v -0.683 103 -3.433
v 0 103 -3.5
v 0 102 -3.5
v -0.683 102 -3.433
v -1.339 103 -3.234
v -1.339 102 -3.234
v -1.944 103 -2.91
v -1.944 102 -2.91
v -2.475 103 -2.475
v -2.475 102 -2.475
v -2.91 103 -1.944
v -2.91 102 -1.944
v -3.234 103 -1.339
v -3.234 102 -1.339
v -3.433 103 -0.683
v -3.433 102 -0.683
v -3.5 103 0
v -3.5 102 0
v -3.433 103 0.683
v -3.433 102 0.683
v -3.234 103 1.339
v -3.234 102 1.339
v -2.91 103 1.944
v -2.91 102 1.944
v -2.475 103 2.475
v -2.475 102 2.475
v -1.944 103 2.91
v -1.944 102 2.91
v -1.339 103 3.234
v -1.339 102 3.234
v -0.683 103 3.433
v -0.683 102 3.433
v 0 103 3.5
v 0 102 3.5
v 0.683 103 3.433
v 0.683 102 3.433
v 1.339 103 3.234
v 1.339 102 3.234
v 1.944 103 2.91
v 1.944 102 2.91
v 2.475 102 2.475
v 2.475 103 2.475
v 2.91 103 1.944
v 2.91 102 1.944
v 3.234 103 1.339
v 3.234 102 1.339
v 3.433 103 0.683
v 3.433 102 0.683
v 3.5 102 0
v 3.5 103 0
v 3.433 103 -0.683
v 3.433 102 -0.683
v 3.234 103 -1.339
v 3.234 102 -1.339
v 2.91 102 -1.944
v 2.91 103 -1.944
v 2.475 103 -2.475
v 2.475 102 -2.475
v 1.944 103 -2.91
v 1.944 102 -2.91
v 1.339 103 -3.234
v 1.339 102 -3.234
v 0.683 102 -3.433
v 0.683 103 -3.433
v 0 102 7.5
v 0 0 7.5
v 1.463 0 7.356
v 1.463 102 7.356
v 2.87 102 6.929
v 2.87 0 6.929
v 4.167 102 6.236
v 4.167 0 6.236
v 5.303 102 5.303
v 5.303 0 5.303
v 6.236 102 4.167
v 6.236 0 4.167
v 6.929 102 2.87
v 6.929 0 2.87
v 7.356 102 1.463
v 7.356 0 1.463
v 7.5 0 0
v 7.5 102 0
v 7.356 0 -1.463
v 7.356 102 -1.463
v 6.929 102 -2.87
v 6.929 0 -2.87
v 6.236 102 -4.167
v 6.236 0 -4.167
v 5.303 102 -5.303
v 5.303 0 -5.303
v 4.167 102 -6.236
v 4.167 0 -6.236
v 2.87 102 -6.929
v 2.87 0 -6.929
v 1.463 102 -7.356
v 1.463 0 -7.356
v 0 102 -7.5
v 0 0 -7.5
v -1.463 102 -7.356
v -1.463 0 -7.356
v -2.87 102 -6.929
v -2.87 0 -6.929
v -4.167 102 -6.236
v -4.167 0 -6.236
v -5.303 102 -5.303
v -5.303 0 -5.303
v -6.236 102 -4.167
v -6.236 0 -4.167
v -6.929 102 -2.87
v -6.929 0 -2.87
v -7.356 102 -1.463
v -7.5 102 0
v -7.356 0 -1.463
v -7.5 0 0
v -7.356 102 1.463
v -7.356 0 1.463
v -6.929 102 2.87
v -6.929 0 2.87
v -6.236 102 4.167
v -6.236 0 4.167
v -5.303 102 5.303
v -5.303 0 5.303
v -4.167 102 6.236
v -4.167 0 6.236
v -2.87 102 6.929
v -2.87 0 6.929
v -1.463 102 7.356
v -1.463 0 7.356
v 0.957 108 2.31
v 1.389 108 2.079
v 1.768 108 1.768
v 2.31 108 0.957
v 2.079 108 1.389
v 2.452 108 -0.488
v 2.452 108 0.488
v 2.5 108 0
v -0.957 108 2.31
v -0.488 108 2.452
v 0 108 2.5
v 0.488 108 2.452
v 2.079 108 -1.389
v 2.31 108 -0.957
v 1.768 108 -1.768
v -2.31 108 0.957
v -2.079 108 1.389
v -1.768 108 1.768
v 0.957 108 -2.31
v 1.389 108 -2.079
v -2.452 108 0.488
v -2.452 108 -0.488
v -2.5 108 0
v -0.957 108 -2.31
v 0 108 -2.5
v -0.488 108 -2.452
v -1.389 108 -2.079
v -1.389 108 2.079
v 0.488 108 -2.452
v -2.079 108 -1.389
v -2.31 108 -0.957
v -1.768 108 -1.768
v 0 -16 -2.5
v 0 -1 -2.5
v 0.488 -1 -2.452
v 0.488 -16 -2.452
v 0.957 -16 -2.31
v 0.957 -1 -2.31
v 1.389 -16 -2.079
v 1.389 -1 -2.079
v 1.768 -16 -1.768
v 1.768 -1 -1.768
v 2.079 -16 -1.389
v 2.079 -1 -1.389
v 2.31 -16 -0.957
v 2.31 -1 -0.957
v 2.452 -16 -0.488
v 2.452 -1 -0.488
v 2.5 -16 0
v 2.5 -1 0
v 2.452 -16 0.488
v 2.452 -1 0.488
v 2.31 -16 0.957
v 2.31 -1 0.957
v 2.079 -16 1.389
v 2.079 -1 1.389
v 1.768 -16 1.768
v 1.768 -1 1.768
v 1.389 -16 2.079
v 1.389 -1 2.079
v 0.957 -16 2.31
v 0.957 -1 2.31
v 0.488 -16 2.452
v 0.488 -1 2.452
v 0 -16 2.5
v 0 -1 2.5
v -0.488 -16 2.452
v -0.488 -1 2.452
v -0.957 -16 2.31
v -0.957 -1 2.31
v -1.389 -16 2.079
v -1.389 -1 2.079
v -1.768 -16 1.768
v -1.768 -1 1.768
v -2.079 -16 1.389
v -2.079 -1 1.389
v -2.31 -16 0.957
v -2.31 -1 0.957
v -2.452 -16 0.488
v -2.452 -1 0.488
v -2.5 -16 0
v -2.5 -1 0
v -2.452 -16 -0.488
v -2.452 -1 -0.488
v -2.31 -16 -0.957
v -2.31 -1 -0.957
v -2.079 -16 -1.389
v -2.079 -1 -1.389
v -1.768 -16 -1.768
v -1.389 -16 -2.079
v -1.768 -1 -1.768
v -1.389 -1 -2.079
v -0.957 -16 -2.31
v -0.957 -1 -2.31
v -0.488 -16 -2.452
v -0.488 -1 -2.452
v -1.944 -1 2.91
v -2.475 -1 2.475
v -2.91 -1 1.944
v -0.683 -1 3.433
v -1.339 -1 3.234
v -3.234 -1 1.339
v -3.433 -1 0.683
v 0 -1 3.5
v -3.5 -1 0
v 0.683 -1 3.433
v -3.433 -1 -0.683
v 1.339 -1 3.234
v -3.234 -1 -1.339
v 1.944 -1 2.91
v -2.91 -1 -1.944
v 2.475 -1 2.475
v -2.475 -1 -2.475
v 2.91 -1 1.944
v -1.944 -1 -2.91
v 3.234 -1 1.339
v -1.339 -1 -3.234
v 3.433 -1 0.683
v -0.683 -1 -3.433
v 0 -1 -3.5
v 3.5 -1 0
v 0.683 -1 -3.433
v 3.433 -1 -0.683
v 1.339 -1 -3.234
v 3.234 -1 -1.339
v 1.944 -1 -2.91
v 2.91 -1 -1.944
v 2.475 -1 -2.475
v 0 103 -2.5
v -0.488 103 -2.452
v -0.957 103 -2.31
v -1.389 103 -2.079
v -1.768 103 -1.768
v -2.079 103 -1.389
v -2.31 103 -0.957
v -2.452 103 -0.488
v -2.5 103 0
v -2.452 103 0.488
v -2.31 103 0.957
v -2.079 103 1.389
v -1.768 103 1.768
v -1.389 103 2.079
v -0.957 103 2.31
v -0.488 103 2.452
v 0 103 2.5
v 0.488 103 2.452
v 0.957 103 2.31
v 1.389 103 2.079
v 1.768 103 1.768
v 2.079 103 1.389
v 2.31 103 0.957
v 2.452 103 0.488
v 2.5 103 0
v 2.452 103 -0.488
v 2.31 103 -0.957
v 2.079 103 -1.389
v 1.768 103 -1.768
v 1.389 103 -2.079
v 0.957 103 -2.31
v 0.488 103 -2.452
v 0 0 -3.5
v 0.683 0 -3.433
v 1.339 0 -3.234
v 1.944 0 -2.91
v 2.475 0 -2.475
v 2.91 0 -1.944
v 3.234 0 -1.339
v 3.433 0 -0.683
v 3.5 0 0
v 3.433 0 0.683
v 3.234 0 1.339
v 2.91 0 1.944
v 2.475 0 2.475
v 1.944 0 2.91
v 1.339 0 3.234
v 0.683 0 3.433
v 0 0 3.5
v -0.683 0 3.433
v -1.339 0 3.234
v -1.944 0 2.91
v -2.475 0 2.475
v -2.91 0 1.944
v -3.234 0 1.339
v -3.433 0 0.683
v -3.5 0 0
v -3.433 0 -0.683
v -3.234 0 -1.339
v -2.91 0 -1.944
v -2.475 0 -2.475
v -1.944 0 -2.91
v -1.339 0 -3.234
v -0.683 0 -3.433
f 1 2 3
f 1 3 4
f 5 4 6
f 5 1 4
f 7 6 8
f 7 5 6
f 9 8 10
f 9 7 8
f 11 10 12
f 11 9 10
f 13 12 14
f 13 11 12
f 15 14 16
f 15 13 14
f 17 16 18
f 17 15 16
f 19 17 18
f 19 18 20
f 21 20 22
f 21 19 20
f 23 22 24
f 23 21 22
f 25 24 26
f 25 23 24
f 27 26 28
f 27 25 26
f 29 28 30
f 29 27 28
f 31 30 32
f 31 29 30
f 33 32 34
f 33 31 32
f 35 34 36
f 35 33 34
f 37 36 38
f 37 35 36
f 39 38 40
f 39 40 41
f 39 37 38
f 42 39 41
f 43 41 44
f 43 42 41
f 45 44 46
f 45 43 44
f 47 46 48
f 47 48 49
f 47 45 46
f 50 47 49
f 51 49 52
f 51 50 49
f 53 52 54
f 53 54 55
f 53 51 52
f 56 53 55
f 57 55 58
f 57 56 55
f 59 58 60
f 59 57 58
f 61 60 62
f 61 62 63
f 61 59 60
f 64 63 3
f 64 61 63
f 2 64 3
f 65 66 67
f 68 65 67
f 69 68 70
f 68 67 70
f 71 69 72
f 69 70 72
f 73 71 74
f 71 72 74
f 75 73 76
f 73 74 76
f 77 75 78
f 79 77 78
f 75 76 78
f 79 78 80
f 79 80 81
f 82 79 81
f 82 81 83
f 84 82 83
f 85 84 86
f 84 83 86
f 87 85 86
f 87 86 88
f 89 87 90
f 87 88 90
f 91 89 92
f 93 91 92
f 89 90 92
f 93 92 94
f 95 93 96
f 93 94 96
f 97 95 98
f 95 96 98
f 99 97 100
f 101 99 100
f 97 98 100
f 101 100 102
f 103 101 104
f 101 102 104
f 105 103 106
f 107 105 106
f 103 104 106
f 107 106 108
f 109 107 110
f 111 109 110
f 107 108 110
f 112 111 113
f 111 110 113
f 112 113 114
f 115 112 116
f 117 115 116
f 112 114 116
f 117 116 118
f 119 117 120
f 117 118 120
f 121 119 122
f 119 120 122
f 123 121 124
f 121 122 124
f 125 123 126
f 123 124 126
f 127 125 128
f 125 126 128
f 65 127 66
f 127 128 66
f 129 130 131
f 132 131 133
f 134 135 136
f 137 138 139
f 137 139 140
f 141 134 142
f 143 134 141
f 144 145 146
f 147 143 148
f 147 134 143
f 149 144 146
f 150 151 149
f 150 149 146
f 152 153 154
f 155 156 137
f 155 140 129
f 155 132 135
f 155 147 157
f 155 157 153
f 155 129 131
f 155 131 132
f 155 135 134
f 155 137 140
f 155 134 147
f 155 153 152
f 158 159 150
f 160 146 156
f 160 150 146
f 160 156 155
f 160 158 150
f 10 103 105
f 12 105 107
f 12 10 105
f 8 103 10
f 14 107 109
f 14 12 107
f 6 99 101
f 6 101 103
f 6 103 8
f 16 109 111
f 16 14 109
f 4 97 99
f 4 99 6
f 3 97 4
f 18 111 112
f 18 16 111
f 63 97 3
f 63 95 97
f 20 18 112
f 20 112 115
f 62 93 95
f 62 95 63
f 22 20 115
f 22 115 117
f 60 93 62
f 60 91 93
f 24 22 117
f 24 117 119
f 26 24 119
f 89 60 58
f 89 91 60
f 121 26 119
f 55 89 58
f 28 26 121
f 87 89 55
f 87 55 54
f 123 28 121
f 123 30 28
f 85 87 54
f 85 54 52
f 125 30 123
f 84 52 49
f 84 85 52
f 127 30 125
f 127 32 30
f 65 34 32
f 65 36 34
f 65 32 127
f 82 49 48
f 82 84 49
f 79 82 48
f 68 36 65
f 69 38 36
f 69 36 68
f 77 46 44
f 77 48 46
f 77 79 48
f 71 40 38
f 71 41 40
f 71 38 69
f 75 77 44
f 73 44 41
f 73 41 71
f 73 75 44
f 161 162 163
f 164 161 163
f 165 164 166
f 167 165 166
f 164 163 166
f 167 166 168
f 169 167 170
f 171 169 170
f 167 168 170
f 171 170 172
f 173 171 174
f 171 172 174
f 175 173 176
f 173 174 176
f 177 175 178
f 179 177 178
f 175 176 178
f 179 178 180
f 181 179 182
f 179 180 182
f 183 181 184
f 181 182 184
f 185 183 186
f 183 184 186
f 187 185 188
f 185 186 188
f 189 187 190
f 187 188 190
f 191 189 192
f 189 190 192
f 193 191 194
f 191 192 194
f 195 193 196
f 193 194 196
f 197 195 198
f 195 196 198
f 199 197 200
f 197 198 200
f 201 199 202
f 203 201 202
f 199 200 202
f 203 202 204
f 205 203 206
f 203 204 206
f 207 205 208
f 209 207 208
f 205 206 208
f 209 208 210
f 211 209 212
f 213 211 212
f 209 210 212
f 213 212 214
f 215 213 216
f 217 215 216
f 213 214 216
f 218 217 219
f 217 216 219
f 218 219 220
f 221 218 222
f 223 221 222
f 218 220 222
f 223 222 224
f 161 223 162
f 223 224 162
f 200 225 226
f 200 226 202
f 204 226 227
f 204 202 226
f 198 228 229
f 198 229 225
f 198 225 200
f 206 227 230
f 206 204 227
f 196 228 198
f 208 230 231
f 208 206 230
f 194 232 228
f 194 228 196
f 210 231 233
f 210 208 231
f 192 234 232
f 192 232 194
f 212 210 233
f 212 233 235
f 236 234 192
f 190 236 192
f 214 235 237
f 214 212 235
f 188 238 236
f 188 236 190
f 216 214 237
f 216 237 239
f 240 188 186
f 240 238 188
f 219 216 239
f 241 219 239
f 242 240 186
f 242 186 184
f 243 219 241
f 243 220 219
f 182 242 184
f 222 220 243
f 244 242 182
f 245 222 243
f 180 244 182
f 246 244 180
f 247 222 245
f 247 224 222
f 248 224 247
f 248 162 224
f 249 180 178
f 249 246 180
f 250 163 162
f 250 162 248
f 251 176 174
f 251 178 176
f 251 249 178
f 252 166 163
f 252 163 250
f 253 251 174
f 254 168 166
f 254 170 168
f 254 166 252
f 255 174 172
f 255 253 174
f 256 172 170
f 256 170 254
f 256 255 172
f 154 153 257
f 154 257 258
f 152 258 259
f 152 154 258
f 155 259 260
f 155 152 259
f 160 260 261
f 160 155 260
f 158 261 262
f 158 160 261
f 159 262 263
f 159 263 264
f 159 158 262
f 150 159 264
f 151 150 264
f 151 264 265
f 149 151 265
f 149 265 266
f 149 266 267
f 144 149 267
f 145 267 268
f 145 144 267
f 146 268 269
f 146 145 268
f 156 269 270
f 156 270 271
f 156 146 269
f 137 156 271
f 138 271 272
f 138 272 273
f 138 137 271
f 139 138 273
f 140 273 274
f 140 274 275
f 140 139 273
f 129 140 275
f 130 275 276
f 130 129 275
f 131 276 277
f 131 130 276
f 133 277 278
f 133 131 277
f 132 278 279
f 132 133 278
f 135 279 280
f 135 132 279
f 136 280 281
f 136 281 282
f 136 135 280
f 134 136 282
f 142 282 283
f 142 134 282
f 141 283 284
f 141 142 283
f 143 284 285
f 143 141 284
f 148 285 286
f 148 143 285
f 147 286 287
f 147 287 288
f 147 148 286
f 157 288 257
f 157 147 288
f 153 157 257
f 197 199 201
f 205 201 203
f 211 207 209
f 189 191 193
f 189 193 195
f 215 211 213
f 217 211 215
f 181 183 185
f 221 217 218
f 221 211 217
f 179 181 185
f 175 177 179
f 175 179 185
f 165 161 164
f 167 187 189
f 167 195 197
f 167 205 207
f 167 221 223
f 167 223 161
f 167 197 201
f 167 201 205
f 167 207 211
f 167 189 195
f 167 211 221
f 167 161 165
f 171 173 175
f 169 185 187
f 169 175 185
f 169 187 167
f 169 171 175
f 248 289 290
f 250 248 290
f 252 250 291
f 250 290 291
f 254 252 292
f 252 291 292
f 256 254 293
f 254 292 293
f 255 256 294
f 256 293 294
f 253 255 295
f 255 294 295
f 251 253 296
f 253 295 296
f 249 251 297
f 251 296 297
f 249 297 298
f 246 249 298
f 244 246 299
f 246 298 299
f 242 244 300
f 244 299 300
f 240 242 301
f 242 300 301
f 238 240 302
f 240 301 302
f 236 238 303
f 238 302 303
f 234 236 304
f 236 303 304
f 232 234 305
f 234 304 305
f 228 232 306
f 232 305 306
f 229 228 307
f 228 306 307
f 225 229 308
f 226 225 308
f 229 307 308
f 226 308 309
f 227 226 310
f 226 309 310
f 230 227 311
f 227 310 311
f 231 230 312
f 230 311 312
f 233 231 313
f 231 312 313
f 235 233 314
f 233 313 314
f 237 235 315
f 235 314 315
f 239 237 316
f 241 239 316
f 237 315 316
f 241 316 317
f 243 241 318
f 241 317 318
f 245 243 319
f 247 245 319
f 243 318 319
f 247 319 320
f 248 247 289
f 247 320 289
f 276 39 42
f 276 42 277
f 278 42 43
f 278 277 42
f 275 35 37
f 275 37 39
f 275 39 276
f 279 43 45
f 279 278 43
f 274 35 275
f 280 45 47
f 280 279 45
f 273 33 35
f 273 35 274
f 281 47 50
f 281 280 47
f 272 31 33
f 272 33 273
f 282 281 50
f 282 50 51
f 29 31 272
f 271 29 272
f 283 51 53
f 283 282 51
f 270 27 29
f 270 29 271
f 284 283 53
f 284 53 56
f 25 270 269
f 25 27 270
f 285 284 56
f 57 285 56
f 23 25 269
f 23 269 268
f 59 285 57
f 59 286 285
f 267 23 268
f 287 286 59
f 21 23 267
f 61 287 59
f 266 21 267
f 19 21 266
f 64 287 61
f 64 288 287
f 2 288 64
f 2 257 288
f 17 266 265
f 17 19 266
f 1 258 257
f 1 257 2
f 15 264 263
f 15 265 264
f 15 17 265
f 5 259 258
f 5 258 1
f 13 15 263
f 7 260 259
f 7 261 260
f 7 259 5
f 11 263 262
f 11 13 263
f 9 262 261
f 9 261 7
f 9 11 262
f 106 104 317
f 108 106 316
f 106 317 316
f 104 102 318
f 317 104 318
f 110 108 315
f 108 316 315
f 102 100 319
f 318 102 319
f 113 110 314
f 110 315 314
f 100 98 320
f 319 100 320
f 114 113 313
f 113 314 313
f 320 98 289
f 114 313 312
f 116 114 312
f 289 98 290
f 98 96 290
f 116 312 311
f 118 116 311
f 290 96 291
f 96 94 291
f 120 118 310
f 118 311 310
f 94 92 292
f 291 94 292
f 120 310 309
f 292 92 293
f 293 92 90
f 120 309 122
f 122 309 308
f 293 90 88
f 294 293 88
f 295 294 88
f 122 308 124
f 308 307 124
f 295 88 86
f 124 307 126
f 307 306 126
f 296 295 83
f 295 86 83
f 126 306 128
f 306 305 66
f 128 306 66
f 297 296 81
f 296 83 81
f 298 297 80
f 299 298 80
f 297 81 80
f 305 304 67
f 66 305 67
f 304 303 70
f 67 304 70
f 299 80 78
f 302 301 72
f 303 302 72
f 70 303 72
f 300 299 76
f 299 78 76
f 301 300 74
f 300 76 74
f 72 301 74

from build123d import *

# Parameters (mm, degrees)
SKETCH1_R           = 7.5
BOSS_EXTRUDE1_DEPTH = 102
SKETCH2_R           = 3.5
BOSS_EXTRUDE2_DEPTH = 1
SKETCH3_R           = 2.5
BOSS_EXTRUDE3_DEPTH = 15
BOSS_EXTRUDE4_START = 1
SKETCH4_R           = 3.5
BOSS_EXTRUDE4_DEPTH = 1
BOSS_EXTRUDE5_START = 5
SKETCH5_R           = 2.5
BOSS_EXTRUDE5_DEPTH = 5


with BuildPart() as part:
    # Sketch1 → Boss-Extrude1 (new body)
    with BuildSketch(Plane(origin=(0, 0, 0), x_dir=(1, 0, 0), z_dir=(0, 1, 0))):
        with Locations(Location((0, 0, 0), (0, 0, 270))):
            Circle(SKETCH1_R)
    extrude(amount=BOSS_EXTRUDE1_DEPTH)

    # Sketch2 → Boss-Extrude2 (add)
    with BuildSketch(Plane.XZ):
        with Locations(Location((0, 0, 0), (0, 0, 270))):
            Circle(SKETCH2_R)
    extrude(amount=BOSS_EXTRUDE2_DEPTH)

    # Sketch3 → Boss-Extrude3 (add)
    with BuildSketch(Plane.XZ.offset(1)):
        with Locations(Location((0, 0, 0), (0, 0, 270))):
            Circle(SKETCH3_R)
    extrude(amount=BOSS_EXTRUDE3_DEPTH)

    # Sketch4 → Boss-Extrude4 (add)
    with BuildSketch(Plane(origin=(0, 102, 0), x_dir=(1, 0, 0), z_dir=(0, 1, 0)).offset(BOSS_EXTRUDE4_START)):
        with Locations(Location((0, 0, 0), (0, 0, 90))):
            Circle(SKETCH4_R)
    extrude(amount=-BOSS_EXTRUDE4_DEPTH)

    # Sketch5 → Boss-Extrude5 (add)
    with BuildSketch(Plane(origin=(0, 103, 0), x_dir=(1, 0, 0), z_dir=(0, 1, 0)).offset(BOSS_EXTRUDE5_START)):
        with Locations(Location((0, 0, 0), (0, 0, 90))):
            Circle(SKETCH5_R)
    extrude(amount=-BOSS_EXTRUDE5_DEPTH)


solid = part.part
